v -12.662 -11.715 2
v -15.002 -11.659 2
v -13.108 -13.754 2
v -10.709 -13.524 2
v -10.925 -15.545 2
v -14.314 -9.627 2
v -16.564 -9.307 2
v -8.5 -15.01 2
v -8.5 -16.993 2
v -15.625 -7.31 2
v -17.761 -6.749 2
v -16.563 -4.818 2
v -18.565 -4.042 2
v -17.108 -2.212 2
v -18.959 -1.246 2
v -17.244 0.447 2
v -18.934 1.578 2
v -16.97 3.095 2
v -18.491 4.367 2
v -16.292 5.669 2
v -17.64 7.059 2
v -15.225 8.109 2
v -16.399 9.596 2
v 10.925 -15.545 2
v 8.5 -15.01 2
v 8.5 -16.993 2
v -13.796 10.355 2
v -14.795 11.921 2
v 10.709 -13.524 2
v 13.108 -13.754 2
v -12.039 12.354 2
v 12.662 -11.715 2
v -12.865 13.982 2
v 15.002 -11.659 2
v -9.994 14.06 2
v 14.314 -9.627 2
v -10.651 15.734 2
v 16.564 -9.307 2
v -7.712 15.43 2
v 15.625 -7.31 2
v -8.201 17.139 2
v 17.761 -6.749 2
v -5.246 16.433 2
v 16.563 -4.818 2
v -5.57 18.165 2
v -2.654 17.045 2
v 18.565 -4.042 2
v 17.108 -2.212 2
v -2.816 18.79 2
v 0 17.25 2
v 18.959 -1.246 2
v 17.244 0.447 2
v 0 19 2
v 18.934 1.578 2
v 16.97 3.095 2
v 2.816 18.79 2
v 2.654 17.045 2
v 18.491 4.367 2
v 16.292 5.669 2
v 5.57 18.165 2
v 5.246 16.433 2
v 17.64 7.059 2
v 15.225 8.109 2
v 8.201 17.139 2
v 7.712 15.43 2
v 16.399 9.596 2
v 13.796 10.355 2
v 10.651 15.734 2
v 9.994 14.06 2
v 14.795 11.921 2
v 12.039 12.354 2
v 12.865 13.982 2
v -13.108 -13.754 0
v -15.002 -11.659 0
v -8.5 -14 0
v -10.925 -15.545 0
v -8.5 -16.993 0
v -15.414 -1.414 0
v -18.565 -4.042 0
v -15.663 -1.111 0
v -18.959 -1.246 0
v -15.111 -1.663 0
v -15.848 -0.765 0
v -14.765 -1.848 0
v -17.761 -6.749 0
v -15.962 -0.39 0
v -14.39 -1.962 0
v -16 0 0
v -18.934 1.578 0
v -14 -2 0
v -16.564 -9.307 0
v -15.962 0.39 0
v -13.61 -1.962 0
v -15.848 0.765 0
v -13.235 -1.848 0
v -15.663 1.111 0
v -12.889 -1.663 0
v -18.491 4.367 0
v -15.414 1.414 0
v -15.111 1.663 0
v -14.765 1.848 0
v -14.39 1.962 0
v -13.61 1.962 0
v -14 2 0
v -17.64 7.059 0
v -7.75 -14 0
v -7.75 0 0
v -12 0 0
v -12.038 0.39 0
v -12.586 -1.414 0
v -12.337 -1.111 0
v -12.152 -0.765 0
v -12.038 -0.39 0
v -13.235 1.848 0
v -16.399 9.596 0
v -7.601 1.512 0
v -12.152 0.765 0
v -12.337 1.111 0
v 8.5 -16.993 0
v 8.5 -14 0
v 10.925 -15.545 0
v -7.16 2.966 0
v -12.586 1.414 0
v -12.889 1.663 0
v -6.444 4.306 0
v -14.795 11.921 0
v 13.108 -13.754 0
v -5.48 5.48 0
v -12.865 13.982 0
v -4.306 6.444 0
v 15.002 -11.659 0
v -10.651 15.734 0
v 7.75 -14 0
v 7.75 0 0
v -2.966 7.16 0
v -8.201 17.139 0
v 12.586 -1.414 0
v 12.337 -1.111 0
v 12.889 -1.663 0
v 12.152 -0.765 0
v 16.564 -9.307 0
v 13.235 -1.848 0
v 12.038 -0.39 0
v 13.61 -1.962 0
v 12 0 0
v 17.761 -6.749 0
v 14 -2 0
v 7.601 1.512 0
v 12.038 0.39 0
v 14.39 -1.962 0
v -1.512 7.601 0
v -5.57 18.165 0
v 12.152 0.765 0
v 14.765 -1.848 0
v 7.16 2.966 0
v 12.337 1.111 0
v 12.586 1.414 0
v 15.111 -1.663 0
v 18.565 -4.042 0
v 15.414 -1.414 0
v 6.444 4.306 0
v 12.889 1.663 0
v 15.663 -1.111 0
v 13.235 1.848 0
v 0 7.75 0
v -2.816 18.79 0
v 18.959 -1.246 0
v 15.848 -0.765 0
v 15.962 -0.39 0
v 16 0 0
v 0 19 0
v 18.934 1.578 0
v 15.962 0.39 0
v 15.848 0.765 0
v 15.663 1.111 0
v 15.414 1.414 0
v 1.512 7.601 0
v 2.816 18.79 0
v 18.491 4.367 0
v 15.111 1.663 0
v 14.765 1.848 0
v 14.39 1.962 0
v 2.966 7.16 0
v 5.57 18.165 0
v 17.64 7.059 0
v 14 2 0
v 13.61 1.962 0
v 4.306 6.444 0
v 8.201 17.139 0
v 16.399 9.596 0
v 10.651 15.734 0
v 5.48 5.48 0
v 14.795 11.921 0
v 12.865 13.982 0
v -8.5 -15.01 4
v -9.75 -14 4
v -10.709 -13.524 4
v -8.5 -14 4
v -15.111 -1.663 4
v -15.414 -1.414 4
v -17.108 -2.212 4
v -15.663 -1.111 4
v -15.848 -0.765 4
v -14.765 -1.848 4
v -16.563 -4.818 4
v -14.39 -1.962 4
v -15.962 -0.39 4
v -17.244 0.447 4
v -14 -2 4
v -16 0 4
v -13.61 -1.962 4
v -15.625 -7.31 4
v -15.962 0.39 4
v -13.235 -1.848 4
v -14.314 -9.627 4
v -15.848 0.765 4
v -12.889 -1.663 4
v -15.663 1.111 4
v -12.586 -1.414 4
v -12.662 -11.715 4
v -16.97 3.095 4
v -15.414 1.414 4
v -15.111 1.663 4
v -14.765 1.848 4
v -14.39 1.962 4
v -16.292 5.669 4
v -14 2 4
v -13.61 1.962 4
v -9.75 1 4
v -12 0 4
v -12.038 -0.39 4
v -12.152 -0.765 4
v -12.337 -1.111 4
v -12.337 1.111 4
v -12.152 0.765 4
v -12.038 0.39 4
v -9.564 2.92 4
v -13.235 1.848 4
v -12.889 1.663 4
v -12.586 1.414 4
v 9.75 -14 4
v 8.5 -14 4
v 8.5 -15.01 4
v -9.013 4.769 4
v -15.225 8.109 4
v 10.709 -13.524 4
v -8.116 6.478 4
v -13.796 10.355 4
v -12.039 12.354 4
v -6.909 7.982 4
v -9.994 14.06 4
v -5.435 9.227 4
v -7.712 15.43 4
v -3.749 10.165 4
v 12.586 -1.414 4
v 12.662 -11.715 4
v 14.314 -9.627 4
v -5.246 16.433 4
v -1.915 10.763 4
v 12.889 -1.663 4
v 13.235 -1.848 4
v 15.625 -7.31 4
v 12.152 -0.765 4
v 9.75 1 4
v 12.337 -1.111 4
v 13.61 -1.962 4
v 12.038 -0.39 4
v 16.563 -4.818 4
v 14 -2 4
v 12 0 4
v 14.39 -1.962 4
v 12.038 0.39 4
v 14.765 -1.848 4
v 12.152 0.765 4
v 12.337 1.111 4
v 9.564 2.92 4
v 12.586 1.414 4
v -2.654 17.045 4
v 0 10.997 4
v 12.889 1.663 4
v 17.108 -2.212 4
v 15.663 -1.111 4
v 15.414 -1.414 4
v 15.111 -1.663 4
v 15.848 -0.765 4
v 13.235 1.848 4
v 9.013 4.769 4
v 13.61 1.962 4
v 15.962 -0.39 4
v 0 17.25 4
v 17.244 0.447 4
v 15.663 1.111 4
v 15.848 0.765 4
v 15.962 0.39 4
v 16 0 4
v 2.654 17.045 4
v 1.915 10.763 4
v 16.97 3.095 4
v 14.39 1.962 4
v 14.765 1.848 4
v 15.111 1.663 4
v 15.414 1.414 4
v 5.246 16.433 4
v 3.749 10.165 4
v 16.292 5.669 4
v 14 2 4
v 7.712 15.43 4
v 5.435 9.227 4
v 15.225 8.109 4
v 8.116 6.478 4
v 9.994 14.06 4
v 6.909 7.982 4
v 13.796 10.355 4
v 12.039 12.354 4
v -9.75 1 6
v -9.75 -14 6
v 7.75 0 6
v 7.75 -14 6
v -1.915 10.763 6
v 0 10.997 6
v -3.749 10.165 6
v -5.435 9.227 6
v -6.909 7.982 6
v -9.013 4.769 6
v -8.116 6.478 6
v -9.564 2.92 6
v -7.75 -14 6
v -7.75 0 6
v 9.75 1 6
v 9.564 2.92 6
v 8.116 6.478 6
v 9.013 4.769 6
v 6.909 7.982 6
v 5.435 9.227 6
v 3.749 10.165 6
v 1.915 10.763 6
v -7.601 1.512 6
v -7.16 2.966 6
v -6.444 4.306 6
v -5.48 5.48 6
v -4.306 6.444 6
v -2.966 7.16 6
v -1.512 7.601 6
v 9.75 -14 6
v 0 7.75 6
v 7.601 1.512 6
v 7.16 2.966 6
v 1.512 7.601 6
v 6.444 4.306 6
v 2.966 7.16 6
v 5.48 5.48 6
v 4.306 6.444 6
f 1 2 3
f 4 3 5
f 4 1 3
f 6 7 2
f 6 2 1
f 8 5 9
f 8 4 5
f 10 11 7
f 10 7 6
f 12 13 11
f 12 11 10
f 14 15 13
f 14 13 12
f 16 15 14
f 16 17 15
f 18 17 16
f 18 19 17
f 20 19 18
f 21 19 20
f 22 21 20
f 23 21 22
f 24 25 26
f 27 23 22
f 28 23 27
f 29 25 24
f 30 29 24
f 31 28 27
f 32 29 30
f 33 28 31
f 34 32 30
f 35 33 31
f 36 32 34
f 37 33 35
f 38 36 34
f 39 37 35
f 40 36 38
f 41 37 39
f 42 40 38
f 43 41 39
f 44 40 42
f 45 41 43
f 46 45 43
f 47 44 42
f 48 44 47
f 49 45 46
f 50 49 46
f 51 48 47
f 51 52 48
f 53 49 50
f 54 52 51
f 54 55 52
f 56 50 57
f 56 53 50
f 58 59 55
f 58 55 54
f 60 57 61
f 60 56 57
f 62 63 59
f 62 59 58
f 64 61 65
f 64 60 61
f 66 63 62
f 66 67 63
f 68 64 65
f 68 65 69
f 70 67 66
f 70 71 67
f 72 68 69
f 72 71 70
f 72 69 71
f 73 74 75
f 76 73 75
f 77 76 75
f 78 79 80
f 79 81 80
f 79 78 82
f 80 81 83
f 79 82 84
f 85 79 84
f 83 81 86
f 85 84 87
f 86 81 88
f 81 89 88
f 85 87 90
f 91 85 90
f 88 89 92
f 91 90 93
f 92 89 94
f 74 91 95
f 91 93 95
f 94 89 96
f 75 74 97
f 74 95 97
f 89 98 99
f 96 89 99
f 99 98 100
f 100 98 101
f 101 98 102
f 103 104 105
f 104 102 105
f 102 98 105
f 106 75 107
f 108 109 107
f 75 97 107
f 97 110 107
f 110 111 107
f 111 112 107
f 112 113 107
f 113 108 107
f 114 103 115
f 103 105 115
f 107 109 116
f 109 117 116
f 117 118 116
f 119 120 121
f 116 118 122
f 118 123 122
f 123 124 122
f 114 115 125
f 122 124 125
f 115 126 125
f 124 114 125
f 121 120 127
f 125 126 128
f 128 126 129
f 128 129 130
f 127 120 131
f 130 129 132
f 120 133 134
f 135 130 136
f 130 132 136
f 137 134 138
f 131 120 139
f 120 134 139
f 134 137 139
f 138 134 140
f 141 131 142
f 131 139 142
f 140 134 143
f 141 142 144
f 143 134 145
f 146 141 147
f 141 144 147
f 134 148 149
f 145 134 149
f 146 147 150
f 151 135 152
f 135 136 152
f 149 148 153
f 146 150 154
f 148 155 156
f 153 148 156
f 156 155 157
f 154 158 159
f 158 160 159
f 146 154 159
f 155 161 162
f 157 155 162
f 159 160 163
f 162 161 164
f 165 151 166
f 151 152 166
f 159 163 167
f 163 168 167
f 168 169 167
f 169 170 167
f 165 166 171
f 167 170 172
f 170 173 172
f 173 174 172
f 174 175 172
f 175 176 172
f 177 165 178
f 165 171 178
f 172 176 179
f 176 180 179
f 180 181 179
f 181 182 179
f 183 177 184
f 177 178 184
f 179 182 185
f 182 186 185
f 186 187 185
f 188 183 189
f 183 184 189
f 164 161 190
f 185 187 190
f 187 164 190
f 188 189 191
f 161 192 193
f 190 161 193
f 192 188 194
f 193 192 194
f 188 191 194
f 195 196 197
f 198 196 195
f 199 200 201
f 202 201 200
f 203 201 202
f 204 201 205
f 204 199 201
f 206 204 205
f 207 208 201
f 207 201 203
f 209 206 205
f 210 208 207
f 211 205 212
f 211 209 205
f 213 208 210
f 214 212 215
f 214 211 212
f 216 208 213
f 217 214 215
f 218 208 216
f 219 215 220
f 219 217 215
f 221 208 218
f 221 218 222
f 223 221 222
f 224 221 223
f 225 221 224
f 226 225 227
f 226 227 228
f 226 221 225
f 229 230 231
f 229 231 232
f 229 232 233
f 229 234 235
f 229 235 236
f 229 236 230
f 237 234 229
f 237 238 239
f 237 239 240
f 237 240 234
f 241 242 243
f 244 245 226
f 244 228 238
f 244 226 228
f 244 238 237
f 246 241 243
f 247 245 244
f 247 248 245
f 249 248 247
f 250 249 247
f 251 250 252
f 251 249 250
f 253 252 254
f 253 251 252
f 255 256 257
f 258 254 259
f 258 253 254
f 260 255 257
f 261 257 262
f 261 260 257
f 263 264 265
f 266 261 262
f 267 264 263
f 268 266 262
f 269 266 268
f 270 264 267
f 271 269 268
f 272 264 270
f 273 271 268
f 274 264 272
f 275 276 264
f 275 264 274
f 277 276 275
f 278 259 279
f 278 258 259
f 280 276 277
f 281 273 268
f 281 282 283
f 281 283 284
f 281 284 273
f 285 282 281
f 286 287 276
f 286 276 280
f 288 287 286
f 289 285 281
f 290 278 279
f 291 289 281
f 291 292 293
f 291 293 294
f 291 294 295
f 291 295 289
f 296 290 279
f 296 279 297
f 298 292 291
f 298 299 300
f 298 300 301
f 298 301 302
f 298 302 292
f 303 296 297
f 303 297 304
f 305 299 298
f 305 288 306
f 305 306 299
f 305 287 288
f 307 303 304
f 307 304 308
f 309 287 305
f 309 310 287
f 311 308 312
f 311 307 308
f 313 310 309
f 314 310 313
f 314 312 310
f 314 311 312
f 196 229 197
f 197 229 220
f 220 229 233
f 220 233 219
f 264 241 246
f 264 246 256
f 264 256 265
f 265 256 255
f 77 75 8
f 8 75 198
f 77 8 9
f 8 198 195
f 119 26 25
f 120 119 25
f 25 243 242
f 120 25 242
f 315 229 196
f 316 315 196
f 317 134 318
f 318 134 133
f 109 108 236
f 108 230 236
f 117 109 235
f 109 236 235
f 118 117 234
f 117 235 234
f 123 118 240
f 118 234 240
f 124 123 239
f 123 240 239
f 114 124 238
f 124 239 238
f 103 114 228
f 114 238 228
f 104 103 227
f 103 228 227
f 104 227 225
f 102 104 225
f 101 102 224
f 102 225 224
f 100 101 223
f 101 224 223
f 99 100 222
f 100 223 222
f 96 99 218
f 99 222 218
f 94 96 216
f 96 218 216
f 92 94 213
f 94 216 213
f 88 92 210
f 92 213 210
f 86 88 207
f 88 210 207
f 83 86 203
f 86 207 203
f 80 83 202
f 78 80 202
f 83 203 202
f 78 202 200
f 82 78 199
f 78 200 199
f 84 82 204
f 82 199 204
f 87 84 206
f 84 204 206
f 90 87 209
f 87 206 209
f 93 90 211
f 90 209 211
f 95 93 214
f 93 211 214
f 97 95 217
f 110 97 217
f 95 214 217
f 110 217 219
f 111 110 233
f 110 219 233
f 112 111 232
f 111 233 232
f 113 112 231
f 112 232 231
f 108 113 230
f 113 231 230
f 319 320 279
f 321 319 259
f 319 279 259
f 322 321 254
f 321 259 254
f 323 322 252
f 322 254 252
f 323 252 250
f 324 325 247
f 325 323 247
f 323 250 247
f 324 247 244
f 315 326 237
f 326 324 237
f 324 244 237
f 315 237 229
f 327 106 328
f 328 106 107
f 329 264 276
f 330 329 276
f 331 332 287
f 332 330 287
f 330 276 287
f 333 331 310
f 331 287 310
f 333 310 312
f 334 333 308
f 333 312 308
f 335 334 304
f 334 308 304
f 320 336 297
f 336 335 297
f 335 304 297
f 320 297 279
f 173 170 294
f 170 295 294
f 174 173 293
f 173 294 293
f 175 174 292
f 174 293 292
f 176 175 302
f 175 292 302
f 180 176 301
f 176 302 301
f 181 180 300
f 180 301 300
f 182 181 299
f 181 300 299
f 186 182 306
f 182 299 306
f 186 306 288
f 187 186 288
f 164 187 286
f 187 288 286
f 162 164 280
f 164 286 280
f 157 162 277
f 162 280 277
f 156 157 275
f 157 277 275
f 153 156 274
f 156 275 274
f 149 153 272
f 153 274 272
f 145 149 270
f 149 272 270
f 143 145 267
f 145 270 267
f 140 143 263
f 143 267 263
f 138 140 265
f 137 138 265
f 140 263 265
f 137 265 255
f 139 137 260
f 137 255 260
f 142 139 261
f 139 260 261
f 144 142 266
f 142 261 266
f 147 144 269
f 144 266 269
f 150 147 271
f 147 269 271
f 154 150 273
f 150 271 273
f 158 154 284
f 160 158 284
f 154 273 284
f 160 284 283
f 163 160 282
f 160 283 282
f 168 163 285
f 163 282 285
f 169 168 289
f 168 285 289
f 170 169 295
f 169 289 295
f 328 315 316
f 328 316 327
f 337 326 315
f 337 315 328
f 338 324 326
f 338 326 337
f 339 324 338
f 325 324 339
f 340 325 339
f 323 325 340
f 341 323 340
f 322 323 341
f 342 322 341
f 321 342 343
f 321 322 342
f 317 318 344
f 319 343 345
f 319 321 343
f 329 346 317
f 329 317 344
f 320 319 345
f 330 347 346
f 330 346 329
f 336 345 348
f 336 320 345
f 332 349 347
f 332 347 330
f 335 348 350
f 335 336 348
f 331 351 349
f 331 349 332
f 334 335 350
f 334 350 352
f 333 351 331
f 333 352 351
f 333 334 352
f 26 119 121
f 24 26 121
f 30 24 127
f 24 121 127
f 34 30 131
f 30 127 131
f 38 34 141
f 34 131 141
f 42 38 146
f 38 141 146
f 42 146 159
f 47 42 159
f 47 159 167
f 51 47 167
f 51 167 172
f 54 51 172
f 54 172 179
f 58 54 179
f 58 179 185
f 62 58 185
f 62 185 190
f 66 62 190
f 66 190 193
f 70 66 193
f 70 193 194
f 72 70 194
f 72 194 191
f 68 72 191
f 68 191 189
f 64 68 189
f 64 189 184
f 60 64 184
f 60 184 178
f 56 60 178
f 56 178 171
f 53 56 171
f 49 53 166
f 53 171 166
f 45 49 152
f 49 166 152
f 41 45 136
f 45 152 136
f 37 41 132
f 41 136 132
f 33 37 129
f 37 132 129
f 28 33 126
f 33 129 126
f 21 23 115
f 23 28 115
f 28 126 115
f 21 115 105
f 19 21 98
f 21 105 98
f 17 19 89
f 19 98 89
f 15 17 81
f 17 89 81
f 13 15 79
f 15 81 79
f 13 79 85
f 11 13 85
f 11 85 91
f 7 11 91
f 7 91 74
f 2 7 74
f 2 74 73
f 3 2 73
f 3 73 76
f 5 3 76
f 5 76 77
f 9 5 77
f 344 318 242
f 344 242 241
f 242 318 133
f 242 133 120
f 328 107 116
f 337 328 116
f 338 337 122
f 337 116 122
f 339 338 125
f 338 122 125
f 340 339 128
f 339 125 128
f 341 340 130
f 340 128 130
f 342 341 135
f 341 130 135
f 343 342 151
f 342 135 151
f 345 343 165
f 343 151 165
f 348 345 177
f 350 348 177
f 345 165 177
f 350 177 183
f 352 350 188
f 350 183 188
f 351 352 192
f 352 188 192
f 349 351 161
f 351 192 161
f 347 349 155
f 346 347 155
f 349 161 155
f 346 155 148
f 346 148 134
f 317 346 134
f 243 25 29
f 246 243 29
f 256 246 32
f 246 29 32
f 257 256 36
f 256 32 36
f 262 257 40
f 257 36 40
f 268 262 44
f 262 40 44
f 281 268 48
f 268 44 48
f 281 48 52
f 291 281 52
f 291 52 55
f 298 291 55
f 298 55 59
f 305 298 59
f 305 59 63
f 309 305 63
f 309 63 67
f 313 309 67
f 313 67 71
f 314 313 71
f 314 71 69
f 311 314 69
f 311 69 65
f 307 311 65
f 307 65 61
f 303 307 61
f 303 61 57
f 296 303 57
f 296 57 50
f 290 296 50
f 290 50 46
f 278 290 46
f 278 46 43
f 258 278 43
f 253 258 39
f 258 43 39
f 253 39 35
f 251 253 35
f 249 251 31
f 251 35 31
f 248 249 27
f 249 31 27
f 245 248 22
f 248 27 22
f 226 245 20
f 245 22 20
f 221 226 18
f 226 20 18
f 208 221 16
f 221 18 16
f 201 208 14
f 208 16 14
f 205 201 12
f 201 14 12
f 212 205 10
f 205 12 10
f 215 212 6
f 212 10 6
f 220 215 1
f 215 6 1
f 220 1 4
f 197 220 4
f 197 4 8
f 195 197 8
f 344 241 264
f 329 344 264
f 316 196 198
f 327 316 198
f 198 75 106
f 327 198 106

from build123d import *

# Parameters (mm, degrees)
F0_R        = 19
F1_DEPTH    = 2
F2_R        = 17.25
F3_DEPTH    = 2
F5_DEPTH    = 25
F7_DEPTH    = 6
F8_T1_DEPTH = 27
F9_R        = 2
F10_DEPTH   = 25
F11_R       = 2
F12_DEPTH   = 25
F13_R       = 2
F14_DEPTH   = 25


# Not quite as in the source:
# - a fillet or chamfer that OpenCascade refuses, or shapes differently, is made with other operations: its cross-section is extruded or revolved along the edge and cut away or added


with BuildPart() as f1:
    # F0 (on Top) → F1 (new body)
    with BuildSketch(Plane.XY):
        Circle(F0_R)
    extrude(amount=F1_DEPTH)

    # F2 (on face) → F3 (join)
    with BuildSketch(Plane.XY.offset(2)):
        Circle(F2_R)
    extrude(amount=F3_DEPTH)

    # F4 (on face) → F5 (cut)
    with BuildSketch(Plane.XY.offset(4)):
        with BuildLine():
            Line((0, 0), (8.5, 0))
            ThreePointArc((8.5, 0), (0, 8.5), (-8.5, 0))
            Line((-8.5, 0), (0, 0))
        make_face()
        with BuildLine():
            ThreePointArc((-8.5, 0), (0, -8.5), (8.5, 0))
            Line((8.5, 0), (0, 0))
            Line((0, 0), (-8.5, 0))
        make_face()
        with BuildLine():
            Line((8.5, -31.9736860693), (8.5, -15.0104130523))
            ThreePointArc((8.5, -15.0104130523), (0, -17.25), (-8.5, -15.0104130523))
            Line((-8.5, -15.0104130523), (-8.5, -31.0855284333))
            Line((-8.5, -31.0855284333), (8.5, -31.9736860693))
        make_face()
        with BuildLine():
            Line((8.5, -15.0104130523), (8.5, 0))
            ThreePointArc((8.5, 0), (0, -8.5), (-8.5, 0))
            Line((-8.5, 0), (-8.5, -15.0104130523))
            ThreePointArc((-8.5, -15.0104130523), (0, -17.25), (8.5, -15.0104130523))
        make_face()
    extrude(amount=-F5_DEPTH, mode=Mode.SUBTRACT)

    # F6 (on Top) → F7 (join)
    with BuildSketch(Plane.XY):
        with BuildLine():
            ThreePointArc((-7.75, 0), (0, 7.75), (7.75, 0))
            Line((7.75, 0), (7.75, -14))
            Line((7.75, -14), (9.75, -14))
            Line((9.75, -14), (9.75, 11))
            Line((9.75, 11), (-9.75, 11))
            Line((-9.75, 11), (-9.75, -14))
            Line((-9.75, -14), (-7.75, -14))
            Line((-7.75, -14), (-7.75, 0))
        make_face()
    extrude(amount=F7_DEPTH)

    # F8: fillet of radius 10 on 2 edges, made by hand

    # F8_s2 → F8_t1 (cut)
    with BuildSketch(Plane.XY.offset(4)):
        with BuildLine():
            ThreePointArc((9.75, 1), (6.8210678119, 8.0710678119), (-0.25, 11))
            Line((-0.25, 11), (9.75, 11))
            Line((9.75, 11), (9.75, 1))
        make_face()
        with BuildLine():
            ThreePointArc((0.25, 11), (-6.8210678119, 8.0710678119), (-9.75, 1))
            Line((-9.75, 1), (-9.75, 11))
            Line((-9.75, 11), (0.25, 11))
        make_face()
    extrude(amount=F8_T1_DEPTH, mode=Mode.SUBTRACT)

    # F9 (on face) → F10 (cut)
    with BuildSketch(Plane.XY.offset(2)):
        with Locations((14, 0)):
            Circle(F9_R)
        with BuildLine():
            ThreePointArc((-16, 0), (-14, -2), (-12, 0))
            ThreePointArc((-12, 0), (-14, 2), (-16, 0))
        make_face()
    extrude(amount=-F10_DEPTH, mode=Mode.SUBTRACT)

    # F11 (on face) → F12 (cut)
    with BuildSketch(Plane(origin=(0, 0, 2), x_dir=(1, 0, 0), z_dir=(0, 0, -1))):
        with Locations((-14, 0)):
            Circle(F11_R)
    extrude(amount=-F12_DEPTH, mode=Mode.SUBTRACT)

    # F13 (on face) → F14 (cut)
    with BuildSketch(Plane(origin=(0, 0, 2), x_dir=(1, 0, 0), z_dir=(0, 0, -1))):
        with Locations((14, 0)):
            Circle(F13_R)
    extrude(amount=-F14_DEPTH, mode=Mode.SUBTRACT)


solid = f1.part
